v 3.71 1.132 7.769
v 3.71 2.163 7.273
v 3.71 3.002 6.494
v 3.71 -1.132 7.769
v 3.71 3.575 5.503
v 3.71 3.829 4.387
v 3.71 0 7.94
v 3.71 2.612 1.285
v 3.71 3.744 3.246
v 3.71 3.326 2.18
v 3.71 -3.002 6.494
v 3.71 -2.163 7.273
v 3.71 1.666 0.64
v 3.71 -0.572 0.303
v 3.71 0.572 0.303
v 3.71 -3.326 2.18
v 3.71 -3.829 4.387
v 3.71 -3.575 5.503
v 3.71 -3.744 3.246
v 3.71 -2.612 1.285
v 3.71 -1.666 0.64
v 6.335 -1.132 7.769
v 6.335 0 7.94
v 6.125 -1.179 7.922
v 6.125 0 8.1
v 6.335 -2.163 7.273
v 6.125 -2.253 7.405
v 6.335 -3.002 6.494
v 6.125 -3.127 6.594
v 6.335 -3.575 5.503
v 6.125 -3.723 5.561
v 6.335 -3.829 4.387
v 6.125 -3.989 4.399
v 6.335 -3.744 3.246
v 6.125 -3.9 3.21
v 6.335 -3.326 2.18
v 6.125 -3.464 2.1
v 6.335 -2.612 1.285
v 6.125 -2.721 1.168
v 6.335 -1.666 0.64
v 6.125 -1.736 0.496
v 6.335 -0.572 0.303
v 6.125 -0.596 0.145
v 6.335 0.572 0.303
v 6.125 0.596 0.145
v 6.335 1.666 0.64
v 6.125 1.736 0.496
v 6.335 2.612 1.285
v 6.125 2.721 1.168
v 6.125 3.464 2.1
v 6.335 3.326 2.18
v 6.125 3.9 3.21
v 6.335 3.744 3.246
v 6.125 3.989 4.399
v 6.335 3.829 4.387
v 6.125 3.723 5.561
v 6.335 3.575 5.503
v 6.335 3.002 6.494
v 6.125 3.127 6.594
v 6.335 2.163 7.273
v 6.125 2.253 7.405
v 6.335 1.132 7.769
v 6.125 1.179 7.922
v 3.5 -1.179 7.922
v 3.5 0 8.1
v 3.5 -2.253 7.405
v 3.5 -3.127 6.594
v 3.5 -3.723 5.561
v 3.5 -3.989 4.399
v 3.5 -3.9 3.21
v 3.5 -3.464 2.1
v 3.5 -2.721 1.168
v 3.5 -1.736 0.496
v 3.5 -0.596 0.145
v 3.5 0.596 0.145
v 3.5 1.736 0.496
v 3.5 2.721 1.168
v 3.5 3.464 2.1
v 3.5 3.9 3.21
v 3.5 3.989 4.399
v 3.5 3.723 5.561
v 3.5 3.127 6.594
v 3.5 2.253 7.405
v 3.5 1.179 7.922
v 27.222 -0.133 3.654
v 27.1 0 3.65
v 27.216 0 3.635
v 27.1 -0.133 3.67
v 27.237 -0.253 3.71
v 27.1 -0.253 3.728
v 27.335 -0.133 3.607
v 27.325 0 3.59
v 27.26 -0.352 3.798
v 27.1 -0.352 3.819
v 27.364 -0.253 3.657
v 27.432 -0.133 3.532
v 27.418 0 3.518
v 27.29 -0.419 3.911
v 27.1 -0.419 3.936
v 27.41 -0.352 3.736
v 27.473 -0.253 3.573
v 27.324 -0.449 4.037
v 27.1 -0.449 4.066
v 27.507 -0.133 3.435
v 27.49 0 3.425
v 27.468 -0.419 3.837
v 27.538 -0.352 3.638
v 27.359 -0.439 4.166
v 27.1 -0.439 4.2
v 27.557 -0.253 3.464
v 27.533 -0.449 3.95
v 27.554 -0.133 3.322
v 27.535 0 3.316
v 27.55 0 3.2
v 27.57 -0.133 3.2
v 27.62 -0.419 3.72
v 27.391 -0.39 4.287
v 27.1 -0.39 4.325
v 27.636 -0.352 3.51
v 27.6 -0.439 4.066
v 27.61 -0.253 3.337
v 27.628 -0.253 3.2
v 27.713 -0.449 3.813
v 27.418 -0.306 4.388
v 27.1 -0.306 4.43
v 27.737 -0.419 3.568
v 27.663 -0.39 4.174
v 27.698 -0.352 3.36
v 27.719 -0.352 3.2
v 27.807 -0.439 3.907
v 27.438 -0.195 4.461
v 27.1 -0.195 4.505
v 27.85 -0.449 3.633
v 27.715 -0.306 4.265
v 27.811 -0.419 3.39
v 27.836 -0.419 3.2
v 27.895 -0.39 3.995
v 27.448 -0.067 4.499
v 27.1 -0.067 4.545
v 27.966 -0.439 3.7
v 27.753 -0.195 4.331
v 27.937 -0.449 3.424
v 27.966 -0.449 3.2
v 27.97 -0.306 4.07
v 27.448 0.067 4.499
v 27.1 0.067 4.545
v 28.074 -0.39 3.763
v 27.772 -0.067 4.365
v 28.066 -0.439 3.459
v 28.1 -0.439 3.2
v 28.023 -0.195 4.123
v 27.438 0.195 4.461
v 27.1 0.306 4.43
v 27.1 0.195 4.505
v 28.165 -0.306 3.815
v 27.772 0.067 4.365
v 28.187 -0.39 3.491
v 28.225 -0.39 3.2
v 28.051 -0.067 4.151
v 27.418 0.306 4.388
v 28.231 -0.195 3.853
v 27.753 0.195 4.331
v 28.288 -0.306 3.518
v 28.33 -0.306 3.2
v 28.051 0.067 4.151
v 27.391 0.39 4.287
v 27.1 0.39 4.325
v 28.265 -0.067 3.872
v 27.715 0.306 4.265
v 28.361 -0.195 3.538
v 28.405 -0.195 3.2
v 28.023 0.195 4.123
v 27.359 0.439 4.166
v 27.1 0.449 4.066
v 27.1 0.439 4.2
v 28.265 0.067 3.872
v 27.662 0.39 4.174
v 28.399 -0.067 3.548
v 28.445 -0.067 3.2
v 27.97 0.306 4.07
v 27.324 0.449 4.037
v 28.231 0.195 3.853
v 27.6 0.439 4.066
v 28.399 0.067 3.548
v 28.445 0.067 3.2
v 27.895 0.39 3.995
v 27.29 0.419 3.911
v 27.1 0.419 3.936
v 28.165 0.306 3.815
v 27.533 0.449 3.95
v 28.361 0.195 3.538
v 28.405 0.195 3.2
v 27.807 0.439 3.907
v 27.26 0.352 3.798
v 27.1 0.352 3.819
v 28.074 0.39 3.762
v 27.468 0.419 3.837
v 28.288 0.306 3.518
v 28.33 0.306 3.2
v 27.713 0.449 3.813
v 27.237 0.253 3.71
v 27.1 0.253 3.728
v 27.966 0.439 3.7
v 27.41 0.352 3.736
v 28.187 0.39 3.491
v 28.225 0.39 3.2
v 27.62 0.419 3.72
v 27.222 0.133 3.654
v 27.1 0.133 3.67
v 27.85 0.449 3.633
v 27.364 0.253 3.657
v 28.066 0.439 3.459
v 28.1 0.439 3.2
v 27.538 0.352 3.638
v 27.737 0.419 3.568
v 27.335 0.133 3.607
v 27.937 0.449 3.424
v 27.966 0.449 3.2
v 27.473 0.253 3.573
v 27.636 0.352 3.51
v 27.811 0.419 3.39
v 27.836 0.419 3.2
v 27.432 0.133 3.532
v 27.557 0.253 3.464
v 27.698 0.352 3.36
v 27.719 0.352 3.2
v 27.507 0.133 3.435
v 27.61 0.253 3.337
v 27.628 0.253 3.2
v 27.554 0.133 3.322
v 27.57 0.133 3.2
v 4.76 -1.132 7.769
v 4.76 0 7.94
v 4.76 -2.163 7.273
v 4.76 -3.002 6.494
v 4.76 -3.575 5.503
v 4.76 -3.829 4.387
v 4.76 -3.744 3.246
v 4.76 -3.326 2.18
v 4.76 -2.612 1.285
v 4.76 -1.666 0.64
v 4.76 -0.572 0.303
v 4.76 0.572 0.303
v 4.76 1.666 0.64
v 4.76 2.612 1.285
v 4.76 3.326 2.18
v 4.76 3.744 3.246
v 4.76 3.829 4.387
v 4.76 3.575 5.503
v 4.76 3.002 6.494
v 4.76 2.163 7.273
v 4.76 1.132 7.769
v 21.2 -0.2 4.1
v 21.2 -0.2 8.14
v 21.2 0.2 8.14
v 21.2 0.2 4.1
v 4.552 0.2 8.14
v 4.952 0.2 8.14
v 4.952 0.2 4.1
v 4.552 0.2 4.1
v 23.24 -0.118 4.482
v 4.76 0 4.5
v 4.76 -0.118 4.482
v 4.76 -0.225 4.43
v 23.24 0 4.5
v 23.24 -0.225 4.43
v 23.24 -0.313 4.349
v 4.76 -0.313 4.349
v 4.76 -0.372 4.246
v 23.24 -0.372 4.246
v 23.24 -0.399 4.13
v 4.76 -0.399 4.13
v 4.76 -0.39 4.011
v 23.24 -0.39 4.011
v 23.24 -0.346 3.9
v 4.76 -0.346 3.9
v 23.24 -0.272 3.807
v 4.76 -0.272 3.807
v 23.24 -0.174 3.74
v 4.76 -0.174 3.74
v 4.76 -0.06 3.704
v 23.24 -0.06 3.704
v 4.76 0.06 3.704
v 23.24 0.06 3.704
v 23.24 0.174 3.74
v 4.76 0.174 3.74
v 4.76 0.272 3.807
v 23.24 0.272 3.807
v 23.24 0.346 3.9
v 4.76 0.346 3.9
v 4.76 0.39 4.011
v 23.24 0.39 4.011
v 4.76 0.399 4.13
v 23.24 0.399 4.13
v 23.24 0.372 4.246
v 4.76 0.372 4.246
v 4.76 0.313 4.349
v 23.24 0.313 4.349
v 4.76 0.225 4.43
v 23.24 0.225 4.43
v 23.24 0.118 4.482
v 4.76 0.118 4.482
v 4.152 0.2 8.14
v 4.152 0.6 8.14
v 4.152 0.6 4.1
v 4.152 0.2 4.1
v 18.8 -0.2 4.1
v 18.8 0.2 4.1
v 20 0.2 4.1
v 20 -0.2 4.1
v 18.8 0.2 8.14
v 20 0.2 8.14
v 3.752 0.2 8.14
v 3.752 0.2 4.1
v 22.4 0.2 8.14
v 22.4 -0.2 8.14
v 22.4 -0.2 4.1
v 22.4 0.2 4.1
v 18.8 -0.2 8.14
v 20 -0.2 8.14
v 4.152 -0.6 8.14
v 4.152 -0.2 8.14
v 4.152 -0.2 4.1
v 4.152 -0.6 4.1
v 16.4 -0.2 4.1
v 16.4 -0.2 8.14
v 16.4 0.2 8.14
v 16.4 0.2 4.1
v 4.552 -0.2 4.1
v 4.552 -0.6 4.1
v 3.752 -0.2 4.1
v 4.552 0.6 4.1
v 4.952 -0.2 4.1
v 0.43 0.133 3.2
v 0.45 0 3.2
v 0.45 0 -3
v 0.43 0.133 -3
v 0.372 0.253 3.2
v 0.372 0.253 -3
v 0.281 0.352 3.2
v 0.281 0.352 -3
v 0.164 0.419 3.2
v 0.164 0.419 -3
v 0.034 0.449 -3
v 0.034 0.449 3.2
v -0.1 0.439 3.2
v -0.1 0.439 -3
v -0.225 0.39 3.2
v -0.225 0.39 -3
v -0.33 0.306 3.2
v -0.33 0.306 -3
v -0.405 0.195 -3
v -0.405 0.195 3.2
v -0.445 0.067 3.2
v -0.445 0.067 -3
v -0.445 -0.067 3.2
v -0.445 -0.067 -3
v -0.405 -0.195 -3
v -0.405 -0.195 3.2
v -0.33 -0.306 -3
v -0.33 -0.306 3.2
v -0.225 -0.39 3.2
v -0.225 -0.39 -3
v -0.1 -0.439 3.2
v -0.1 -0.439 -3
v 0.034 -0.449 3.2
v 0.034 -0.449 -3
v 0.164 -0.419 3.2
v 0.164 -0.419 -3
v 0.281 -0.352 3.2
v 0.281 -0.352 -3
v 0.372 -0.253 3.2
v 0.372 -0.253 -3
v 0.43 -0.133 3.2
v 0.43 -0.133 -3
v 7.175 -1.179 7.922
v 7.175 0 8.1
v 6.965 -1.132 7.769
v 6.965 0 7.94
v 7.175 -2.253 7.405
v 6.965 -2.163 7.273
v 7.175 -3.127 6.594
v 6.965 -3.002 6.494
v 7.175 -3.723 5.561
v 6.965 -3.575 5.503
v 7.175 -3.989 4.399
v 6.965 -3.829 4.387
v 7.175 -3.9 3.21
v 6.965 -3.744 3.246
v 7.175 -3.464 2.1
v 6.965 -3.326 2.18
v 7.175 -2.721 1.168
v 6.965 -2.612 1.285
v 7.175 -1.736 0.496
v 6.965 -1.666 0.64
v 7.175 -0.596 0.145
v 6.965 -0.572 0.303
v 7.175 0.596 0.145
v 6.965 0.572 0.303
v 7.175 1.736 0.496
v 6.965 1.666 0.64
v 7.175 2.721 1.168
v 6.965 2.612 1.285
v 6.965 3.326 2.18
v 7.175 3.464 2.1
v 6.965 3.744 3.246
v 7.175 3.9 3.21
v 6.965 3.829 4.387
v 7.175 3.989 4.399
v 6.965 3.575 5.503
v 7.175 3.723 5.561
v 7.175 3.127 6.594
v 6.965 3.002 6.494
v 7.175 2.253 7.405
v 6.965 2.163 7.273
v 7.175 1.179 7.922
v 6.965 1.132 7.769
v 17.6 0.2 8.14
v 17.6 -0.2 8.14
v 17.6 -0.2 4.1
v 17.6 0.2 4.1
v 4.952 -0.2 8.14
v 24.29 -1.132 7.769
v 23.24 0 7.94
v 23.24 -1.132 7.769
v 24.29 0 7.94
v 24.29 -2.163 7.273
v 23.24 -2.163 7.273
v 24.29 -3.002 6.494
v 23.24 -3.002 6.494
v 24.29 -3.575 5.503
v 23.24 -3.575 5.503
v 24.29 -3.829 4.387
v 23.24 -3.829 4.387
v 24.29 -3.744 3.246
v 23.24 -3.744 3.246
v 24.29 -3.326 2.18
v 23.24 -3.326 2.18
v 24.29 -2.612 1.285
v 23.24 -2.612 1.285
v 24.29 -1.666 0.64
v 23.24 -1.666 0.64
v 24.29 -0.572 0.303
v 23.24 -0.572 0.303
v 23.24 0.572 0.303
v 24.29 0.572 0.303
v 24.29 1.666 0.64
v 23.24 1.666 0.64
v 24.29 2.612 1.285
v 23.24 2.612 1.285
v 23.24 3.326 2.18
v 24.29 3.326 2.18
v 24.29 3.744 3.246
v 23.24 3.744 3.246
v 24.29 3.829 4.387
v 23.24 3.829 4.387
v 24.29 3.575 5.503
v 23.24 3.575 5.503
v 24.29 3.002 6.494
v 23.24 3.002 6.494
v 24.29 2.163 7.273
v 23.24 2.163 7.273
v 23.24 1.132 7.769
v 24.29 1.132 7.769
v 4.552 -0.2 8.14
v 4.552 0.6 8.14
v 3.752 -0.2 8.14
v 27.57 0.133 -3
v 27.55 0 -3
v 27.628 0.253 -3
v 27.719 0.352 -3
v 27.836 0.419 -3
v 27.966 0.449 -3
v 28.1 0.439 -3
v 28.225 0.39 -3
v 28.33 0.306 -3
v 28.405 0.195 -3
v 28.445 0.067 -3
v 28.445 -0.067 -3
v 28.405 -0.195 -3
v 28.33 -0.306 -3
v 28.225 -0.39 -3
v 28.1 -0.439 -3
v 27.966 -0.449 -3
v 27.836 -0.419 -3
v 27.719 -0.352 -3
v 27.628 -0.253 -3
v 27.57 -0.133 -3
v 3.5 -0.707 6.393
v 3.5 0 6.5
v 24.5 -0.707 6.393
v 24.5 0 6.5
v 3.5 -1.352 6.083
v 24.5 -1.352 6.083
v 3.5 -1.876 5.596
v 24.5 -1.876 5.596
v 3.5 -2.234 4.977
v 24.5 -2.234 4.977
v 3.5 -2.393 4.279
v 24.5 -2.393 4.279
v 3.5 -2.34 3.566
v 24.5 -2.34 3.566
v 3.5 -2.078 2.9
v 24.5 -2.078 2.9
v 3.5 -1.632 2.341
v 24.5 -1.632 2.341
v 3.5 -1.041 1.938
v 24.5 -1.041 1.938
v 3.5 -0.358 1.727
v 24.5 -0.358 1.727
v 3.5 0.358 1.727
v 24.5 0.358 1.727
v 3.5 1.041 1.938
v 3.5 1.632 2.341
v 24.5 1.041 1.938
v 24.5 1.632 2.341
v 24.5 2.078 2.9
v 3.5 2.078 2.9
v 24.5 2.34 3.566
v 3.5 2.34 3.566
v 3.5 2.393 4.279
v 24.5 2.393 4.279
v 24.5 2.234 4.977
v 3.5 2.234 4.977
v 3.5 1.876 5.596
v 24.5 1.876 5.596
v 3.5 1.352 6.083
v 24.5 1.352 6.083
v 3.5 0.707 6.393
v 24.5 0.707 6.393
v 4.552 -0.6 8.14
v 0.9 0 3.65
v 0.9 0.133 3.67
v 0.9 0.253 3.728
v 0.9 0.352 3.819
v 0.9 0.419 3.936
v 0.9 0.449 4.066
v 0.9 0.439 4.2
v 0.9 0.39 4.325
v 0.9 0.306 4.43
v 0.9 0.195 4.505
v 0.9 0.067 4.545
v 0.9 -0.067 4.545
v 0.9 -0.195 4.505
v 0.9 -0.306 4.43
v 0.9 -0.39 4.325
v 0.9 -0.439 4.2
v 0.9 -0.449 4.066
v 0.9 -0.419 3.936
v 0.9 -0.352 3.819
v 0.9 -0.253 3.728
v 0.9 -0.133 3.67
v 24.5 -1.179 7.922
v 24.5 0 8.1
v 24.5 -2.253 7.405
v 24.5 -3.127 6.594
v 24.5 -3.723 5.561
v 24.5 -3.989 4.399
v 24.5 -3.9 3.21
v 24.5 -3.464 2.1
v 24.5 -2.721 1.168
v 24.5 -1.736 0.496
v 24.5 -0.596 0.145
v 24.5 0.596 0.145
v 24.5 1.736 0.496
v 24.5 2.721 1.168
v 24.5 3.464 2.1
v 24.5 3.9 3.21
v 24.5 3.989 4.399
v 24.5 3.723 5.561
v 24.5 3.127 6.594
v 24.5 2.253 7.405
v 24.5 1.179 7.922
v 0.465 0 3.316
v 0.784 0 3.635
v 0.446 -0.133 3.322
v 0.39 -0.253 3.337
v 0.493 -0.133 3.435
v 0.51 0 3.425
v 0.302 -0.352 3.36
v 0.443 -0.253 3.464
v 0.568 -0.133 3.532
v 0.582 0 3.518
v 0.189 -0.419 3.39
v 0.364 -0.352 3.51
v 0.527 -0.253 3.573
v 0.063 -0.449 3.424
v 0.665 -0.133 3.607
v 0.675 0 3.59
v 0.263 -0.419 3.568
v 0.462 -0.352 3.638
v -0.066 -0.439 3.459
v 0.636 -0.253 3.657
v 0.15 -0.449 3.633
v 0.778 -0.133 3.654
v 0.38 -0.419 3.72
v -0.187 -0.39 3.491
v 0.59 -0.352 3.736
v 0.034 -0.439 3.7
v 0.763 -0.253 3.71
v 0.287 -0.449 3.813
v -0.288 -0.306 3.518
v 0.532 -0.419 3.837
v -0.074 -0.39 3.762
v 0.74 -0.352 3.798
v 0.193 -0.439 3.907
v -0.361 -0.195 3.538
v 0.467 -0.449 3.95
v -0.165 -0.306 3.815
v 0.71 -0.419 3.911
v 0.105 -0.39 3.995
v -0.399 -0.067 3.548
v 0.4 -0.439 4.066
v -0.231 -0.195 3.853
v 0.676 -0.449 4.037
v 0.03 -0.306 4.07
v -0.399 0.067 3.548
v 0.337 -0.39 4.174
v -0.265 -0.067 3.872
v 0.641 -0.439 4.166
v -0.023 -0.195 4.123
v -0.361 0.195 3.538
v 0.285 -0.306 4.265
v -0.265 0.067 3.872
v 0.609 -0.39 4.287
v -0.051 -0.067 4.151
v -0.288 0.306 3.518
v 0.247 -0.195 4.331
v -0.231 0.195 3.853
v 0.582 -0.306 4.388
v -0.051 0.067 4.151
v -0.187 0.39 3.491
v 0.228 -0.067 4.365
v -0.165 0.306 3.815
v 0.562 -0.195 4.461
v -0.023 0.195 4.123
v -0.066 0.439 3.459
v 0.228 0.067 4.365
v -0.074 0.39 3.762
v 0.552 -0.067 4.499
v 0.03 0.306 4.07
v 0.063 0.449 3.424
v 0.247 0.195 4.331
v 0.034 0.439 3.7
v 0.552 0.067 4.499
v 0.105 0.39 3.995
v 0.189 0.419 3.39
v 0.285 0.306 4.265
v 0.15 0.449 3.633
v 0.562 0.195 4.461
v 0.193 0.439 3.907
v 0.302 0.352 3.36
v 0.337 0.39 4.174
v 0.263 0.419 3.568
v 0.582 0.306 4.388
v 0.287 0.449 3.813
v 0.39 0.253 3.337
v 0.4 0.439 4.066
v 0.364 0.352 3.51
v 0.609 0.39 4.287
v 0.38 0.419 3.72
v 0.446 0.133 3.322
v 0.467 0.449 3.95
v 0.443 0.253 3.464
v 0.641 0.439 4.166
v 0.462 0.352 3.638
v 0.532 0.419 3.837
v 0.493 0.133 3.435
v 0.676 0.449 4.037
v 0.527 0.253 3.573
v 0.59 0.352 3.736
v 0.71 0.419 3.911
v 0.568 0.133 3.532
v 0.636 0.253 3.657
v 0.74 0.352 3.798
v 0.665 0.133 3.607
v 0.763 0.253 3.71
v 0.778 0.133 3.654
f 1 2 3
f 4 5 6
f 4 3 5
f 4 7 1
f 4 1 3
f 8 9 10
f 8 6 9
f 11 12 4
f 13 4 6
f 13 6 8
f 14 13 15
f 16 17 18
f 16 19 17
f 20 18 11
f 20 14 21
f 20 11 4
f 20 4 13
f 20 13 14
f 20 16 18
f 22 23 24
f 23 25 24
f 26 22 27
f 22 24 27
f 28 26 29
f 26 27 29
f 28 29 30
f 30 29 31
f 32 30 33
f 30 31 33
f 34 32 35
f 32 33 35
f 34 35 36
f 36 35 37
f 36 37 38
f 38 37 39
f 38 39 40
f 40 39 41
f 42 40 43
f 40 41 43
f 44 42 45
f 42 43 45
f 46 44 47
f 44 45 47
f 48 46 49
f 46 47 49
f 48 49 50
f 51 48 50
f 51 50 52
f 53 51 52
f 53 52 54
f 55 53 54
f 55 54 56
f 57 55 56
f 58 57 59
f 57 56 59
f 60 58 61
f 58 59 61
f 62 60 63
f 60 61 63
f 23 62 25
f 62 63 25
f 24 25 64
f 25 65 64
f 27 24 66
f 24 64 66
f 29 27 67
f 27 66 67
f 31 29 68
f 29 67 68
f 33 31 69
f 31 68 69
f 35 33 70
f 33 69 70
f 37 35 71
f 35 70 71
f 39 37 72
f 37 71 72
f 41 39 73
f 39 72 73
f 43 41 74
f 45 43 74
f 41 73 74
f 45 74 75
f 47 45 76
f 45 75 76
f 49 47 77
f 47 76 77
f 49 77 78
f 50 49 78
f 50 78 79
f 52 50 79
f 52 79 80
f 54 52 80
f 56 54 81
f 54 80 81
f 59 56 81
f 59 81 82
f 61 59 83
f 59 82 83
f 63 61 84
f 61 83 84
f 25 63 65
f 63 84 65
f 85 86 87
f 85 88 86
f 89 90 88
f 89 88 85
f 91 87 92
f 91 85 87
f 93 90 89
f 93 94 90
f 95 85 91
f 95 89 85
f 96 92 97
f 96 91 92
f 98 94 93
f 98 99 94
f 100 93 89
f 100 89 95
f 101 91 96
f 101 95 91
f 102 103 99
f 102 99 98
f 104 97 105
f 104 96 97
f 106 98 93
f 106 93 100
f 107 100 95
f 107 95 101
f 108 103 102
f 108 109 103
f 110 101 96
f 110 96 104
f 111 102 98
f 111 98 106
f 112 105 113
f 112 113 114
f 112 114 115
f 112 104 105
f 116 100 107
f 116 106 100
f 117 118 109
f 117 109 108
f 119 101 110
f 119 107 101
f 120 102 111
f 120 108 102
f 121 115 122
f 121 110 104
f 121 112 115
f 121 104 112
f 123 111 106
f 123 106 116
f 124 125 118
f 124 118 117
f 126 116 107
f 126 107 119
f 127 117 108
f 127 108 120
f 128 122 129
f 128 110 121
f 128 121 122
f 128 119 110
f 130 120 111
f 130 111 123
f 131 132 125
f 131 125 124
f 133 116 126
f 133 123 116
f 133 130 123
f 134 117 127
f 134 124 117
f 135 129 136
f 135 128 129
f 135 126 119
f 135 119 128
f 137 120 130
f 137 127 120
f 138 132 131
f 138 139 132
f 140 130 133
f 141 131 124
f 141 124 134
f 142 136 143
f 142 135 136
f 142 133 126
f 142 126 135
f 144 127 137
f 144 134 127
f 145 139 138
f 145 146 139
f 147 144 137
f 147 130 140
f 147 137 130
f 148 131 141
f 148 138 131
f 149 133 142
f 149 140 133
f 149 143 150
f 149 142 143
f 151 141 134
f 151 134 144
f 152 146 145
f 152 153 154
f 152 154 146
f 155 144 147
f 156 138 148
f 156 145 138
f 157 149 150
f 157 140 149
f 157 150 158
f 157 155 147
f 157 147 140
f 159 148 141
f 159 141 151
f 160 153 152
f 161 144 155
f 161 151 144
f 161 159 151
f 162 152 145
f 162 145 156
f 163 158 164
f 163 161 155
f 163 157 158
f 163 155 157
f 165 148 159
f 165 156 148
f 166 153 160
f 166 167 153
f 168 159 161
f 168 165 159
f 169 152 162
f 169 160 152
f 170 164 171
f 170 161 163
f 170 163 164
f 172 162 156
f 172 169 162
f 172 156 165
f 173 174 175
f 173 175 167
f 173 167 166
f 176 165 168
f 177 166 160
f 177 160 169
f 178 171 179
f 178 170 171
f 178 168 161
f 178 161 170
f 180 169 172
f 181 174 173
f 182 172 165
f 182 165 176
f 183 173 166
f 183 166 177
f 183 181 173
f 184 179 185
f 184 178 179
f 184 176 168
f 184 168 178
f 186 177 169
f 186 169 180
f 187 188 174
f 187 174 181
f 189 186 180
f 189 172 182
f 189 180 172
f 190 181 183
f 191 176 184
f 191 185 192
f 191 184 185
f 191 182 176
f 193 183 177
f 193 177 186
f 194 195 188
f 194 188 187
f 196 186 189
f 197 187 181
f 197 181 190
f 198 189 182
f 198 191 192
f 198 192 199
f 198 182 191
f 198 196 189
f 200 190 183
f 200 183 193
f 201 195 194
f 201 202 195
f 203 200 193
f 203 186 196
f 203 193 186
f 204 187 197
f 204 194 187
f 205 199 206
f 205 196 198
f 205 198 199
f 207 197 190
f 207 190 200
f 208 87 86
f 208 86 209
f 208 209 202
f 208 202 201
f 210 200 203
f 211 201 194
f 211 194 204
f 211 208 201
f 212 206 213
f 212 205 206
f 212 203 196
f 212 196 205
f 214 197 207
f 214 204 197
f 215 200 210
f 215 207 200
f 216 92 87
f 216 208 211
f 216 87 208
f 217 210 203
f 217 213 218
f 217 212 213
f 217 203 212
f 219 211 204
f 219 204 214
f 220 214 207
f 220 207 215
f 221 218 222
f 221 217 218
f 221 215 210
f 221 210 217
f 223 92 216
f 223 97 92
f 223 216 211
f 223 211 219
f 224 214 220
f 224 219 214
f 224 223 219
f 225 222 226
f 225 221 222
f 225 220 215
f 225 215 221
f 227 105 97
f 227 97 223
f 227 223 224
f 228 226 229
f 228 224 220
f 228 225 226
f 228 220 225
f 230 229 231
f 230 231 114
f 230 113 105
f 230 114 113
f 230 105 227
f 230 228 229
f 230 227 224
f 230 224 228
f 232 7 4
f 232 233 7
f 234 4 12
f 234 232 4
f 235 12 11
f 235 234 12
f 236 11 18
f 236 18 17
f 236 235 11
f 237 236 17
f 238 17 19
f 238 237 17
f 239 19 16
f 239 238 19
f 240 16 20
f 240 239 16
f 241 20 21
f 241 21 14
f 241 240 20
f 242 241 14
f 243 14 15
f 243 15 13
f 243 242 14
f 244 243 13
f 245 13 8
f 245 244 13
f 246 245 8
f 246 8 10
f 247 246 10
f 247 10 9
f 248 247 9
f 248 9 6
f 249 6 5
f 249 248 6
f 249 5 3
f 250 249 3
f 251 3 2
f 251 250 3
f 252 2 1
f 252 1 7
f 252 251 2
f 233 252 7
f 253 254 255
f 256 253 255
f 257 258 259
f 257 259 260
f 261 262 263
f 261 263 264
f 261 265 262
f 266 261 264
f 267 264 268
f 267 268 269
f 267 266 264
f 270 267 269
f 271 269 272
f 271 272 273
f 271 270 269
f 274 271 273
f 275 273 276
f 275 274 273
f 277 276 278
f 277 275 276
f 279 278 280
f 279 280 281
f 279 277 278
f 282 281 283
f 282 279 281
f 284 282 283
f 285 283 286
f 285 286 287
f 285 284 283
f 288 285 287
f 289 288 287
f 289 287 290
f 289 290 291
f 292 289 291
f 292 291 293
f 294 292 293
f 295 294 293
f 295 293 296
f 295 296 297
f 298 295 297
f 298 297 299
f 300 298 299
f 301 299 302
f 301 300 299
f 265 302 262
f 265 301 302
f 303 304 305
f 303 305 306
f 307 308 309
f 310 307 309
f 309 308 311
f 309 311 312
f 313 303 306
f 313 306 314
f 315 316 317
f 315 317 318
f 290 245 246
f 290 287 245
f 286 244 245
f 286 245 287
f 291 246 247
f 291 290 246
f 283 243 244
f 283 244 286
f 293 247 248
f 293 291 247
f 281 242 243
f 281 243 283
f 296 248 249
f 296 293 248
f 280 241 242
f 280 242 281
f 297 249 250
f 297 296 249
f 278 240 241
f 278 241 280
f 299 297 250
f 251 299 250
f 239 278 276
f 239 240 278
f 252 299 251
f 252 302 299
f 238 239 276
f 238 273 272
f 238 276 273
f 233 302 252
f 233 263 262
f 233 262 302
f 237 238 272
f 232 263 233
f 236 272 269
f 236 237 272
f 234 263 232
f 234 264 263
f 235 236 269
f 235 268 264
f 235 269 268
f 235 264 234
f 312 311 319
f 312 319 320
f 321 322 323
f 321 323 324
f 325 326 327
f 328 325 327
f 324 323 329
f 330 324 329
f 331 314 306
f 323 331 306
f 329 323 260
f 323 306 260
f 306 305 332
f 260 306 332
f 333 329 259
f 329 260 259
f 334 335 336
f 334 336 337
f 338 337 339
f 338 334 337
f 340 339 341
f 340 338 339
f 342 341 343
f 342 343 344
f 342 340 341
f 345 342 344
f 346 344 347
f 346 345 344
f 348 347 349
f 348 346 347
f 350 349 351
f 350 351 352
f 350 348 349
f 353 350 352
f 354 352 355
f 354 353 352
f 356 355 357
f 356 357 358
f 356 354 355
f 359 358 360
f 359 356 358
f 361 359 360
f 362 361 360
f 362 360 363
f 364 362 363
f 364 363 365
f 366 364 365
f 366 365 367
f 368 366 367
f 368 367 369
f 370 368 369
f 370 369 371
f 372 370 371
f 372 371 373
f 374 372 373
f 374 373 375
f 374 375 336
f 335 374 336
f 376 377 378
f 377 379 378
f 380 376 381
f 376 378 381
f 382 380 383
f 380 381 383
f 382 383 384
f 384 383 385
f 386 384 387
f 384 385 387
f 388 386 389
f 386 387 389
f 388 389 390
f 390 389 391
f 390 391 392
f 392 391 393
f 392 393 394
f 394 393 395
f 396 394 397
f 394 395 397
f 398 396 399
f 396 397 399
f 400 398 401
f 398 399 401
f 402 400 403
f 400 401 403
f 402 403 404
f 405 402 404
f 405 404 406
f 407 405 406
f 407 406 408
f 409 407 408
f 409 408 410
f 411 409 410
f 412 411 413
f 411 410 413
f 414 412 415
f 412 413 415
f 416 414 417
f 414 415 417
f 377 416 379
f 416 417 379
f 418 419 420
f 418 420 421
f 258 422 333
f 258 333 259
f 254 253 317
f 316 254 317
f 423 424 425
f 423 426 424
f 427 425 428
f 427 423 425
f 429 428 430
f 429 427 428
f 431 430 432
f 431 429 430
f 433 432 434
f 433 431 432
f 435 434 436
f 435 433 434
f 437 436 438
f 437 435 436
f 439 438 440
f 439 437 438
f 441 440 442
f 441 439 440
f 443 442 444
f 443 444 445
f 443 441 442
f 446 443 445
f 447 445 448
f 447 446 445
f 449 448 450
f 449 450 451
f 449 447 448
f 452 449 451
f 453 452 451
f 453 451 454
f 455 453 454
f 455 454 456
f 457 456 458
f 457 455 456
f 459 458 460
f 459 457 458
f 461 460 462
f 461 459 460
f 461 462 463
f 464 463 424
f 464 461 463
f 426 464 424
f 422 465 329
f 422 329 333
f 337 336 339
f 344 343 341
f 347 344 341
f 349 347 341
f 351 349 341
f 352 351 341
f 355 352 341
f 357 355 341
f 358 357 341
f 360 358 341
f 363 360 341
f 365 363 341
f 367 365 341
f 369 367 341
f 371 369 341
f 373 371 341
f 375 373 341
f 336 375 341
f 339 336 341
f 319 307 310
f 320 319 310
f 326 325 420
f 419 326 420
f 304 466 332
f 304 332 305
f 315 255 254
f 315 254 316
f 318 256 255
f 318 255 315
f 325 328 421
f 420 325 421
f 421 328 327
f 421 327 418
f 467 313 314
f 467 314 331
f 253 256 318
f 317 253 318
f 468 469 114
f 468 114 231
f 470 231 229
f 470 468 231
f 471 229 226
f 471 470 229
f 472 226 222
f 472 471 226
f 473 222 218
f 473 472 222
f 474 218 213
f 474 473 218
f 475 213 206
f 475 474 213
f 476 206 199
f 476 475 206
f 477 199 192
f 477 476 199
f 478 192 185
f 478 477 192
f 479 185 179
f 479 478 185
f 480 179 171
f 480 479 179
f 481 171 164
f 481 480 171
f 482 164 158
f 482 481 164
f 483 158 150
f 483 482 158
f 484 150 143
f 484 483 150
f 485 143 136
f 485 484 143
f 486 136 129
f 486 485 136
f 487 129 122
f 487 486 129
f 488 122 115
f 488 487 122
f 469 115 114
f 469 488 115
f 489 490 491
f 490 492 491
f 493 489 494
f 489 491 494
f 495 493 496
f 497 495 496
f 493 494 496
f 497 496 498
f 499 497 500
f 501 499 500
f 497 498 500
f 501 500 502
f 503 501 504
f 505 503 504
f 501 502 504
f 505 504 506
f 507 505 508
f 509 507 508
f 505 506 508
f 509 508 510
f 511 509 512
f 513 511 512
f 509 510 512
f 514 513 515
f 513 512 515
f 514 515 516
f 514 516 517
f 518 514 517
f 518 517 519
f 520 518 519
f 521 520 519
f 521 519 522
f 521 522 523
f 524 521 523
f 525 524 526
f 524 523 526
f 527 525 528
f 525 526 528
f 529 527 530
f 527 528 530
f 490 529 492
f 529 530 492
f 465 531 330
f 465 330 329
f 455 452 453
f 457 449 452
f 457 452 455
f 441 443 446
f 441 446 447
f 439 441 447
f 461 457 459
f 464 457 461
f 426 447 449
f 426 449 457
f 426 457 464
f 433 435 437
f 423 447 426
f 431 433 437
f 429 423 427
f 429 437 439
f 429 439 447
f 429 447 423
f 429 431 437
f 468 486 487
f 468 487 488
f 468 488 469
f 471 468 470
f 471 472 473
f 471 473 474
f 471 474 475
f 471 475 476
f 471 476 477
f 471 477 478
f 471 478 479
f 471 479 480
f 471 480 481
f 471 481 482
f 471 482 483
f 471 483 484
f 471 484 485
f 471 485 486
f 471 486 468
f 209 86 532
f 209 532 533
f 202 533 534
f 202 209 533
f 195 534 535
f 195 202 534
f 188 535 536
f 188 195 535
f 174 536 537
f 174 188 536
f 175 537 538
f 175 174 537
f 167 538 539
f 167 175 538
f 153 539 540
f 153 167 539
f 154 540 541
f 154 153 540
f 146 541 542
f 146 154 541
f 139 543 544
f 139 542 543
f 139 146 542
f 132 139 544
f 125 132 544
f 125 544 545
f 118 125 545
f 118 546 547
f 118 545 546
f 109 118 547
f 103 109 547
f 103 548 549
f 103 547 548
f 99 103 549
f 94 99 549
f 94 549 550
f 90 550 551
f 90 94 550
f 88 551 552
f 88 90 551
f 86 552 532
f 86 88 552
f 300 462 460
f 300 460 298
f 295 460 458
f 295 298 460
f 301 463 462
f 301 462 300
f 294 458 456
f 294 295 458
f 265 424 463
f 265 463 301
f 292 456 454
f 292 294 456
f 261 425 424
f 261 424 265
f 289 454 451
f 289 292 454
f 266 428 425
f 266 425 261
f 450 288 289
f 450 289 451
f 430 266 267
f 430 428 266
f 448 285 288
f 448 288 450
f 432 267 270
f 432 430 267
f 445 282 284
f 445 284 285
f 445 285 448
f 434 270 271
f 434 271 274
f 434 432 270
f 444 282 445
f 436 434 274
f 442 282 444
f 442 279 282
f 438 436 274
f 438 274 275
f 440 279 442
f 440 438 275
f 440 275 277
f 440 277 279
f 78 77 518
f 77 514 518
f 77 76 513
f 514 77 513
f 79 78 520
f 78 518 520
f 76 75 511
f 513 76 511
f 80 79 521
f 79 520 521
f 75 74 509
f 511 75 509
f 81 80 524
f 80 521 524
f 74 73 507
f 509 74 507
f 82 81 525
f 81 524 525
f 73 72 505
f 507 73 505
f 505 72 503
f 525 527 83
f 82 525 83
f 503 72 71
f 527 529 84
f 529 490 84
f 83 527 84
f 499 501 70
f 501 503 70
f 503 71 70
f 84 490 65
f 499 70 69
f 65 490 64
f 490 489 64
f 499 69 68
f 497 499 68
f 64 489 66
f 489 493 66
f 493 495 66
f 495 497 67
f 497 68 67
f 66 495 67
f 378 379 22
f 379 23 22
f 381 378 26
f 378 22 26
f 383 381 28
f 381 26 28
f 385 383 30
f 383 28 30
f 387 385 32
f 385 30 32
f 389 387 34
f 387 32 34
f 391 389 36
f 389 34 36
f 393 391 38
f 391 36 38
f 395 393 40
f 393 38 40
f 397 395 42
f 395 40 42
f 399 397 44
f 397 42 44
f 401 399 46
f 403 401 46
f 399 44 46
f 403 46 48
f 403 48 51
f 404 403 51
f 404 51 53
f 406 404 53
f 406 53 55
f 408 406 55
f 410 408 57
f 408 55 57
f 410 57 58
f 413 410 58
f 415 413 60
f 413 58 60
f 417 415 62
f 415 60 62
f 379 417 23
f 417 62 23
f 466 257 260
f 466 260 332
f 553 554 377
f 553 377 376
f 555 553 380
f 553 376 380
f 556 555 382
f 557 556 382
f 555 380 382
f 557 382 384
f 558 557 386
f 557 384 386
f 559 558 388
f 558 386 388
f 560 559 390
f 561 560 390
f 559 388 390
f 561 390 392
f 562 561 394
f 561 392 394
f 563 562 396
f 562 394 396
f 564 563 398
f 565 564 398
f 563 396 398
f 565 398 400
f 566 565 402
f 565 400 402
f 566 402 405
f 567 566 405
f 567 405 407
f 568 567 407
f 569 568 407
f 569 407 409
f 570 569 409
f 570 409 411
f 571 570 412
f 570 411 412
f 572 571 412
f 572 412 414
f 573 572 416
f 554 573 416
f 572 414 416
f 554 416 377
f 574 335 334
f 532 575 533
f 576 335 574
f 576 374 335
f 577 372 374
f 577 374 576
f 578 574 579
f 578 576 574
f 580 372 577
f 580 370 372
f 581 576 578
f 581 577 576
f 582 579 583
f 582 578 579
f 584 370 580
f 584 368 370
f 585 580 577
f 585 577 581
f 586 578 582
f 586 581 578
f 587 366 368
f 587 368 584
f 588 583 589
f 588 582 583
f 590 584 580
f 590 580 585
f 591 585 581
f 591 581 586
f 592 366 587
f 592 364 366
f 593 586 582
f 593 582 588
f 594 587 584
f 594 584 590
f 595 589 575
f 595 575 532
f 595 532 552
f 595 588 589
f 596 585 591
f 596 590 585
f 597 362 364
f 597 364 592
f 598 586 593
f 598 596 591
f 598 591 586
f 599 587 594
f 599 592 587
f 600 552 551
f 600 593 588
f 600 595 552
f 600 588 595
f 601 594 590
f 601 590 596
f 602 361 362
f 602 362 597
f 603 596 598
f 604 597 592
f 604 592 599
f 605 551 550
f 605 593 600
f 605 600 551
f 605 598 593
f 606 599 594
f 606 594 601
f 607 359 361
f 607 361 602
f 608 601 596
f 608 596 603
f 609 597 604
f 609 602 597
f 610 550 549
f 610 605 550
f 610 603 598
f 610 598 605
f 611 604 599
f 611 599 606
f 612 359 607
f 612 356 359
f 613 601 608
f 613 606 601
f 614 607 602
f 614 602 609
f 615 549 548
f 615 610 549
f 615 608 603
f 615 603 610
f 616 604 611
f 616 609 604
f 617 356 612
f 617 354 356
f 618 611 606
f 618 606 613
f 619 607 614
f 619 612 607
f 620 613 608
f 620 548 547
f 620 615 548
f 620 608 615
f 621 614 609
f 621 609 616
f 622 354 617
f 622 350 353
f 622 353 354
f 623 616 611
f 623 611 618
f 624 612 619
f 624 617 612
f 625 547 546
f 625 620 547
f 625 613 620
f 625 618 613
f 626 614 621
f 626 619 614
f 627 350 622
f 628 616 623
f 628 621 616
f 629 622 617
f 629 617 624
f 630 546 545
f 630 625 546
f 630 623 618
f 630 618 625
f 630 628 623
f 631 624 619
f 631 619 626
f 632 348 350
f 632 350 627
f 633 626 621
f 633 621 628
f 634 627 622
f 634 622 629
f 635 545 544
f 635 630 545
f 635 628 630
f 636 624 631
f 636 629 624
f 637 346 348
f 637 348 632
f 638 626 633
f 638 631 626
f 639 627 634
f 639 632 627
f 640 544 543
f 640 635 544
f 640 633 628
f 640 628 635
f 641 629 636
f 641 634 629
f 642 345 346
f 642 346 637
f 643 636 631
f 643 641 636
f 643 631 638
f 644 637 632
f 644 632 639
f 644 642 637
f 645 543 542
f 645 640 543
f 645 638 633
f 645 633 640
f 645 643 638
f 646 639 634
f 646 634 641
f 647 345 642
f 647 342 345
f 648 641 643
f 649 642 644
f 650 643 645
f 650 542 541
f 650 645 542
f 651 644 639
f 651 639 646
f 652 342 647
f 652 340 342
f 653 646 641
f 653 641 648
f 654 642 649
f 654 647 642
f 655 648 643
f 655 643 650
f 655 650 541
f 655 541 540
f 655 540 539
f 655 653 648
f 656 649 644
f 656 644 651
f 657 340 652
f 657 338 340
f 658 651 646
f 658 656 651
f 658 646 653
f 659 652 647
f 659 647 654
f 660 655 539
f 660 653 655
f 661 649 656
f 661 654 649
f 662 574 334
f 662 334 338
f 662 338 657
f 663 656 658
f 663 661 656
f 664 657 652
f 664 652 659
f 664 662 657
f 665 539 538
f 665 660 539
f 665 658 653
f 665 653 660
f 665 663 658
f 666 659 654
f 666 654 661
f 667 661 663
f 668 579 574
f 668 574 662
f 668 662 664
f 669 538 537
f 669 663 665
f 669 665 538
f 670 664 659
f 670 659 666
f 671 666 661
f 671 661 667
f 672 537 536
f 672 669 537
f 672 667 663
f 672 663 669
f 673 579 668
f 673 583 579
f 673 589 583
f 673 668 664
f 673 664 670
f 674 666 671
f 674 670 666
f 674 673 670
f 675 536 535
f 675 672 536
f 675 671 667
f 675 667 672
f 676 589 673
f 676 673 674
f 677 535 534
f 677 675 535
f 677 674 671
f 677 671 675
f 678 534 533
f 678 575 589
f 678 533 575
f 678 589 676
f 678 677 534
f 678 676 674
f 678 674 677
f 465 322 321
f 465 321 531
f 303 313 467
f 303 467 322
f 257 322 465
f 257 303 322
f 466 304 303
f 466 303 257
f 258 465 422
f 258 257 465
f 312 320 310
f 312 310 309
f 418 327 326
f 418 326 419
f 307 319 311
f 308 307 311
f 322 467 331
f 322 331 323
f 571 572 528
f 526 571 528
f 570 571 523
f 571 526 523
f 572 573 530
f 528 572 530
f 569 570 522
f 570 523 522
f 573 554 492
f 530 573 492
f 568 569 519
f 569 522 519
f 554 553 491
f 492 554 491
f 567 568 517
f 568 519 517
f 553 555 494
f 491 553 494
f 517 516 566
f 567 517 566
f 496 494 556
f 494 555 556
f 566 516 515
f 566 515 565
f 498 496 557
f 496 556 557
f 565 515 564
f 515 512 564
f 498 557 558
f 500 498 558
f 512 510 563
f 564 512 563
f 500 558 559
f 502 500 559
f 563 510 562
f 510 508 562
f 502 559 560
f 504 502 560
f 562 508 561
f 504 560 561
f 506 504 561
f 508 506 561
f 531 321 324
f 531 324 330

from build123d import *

# Parameters (mm, degrees)
SKETCH_R    = 0.45
SKETCH004_W = 1.2
SKETCH004_H = 0.4
PAD_DEPTH   = 4.04


with BuildPart() as sweep_body:
    # Sweep: sweep along a path in Sketch001
    with BuildLine(Plane.XZ) as sweep_path:
        Line((0, -3), (0, 3.2))
        ThreePointArc((0, 3.2), (0.2636, 3.836392), (0.899989, 4.1))
        Line((0.899989, 4.1), (27.1, 4.1))
        ThreePointArc((27.1, 4.1), (27.736396, 3.836396), (28, 3.2))
        Line((28, 3.2), (28, -3))
    # Sketch → Sweep (sweep)
    with BuildSketch(Plane.XY.offset(-2)):
        Circle(SKETCH_R)
    sweep(path=sweep_path.line)


with BuildPart() as revolution:
    # Sketch002 → Revolution (revolve)
    with BuildSketch(Plane.XZ):
        Polygon((3.5, 8.1), (3.5, 6.5), (24.5, 6.5), (24.5, 8.1), (7.175, 8.1), (6.965, 7.94), (6.335, 7.94), (6.125, 8.1), align=None)
    revolve(axis=Axis((6.97588, 0, 4.1), (1, 0, 0)))


with BuildPart() as revolution001:
    # Sketch003 → Revolution001 (revolve)
    with BuildSketch(Plane.XZ):
        Polygon((3.71, 7.94), (4.76, 7.94), (4.76, 4.5), (23.24, 4.5), (23.24, 7.94), (24.29, 7.94), (24.29, 4.1), (3.71, 4.1), align=None)
    revolve(axis=Axis((6.97588, 0, 4.1), (1, 0, 0)))


with BuildPart() as pad:
    # Sketch004 → Pad (new body)
    with BuildSketch(Plane.XY.offset(4.1)):
        with Locations((21.8, 0)):
            Rectangle(SKETCH004_W, SKETCH004_H)
        with Locations((19.4, 0)):
            Rectangle(SKETCH004_W, SKETCH004_H)
        with Locations((17, 0)):
            Rectangle(SKETCH004_W, SKETCH004_H)
        Polygon((4.152, 0.2), (3.752, 0.2), (3.752, -0.2), (4.152, -0.2), (4.152, -0.6), (4.552, -0.6), (4.552, -0.2), (4.952, -0.2), (4.952, 0.2), (4.552, 0.2), (4.552, 0.6), (4.152, 0.6), align=None)
    extrude(amount=PAD_DEPTH)


solid = Compound([sweep_body.part, revolution.part, revolution001.part, pad.part])
